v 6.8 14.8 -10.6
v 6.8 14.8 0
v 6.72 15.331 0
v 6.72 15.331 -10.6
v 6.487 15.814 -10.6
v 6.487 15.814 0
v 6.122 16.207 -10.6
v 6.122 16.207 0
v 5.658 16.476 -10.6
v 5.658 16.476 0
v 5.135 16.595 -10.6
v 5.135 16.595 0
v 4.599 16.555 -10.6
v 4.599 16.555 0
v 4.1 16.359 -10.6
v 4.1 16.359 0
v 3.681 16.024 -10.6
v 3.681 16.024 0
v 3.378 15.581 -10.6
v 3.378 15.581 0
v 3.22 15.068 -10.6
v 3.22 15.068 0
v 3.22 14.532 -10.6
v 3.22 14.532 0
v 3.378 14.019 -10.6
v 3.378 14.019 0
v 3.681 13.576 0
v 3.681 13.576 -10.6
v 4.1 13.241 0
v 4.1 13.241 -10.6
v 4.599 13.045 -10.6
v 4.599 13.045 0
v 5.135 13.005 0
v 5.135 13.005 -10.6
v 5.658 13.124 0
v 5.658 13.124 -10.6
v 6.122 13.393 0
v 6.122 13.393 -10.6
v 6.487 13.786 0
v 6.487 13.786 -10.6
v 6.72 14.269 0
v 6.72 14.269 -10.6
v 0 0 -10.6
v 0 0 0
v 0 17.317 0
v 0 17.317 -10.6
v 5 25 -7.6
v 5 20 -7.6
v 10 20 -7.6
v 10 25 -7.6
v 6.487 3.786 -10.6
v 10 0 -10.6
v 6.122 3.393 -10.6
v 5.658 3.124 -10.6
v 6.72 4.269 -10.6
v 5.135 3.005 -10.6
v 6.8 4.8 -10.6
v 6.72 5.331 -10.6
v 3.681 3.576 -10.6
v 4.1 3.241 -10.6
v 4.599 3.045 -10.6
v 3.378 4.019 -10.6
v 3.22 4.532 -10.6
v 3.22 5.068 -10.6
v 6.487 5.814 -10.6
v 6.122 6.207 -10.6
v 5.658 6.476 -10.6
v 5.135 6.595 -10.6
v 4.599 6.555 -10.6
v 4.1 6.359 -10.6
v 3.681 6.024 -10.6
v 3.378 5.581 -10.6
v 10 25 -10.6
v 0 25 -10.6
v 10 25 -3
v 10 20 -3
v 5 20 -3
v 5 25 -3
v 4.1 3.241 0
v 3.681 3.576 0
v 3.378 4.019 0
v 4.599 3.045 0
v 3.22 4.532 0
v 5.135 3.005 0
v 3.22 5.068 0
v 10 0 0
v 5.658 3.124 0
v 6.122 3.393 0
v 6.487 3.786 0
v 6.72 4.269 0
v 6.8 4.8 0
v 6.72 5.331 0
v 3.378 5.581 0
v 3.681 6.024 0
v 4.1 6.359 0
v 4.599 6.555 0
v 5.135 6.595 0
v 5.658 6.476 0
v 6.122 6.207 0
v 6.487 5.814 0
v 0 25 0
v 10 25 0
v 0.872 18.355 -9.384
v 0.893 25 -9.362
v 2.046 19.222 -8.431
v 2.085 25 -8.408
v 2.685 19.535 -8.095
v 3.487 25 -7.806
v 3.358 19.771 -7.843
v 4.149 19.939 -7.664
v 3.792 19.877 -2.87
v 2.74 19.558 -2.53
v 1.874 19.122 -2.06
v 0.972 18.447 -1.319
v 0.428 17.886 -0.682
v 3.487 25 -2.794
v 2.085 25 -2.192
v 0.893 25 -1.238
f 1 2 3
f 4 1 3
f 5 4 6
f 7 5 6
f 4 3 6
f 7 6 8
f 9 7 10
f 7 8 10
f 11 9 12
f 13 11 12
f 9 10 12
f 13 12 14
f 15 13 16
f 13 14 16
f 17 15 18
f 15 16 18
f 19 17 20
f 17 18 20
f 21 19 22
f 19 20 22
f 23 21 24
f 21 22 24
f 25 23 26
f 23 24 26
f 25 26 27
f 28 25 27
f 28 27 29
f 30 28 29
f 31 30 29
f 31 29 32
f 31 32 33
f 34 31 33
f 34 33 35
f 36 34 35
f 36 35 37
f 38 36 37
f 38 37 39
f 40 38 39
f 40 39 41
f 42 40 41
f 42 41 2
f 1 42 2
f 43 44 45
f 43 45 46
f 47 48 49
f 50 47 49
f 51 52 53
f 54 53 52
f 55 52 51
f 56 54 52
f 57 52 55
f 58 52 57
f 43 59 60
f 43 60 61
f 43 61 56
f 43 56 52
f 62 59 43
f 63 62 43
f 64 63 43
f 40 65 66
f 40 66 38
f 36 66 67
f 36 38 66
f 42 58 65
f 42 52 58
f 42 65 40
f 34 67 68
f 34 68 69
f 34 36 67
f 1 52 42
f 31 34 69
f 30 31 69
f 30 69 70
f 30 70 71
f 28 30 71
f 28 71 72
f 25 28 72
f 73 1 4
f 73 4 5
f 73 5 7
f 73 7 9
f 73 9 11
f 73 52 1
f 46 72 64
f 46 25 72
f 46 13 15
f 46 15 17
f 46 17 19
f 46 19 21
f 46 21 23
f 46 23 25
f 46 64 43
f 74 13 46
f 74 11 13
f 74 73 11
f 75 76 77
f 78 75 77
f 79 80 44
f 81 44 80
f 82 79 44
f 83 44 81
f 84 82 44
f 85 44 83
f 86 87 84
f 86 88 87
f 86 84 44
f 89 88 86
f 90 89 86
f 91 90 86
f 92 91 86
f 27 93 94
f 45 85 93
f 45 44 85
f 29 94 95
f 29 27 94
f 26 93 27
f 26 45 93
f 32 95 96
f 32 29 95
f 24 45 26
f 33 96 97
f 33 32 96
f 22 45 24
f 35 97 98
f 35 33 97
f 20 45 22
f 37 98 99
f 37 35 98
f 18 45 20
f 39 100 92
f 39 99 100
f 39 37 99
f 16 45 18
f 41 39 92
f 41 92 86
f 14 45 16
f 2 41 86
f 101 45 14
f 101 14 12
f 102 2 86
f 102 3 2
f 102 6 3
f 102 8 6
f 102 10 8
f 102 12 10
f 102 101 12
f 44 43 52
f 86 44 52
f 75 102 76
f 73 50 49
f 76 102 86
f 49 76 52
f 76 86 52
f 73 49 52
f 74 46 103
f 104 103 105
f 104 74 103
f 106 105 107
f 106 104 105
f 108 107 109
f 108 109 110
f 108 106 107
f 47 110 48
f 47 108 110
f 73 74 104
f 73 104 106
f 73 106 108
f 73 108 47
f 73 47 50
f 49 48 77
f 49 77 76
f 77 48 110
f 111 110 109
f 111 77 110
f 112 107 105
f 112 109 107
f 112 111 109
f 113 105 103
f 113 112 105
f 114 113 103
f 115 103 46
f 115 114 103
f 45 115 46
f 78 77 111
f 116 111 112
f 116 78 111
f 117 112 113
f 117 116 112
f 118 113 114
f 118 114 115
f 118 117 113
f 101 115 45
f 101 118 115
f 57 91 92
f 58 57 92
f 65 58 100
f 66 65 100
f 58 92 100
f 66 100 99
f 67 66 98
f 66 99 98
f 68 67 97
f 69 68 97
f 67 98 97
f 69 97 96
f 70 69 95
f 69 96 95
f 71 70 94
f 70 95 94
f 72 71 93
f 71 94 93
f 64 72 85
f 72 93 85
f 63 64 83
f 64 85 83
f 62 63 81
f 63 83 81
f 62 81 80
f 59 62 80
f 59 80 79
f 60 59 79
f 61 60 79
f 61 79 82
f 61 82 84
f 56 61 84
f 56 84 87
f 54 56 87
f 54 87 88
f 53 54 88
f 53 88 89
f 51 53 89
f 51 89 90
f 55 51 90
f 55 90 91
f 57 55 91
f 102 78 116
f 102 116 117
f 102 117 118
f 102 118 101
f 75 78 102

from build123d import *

# Parameters (mm, degrees)
SKETCH1_W                       = 10
SKETCH1_H                       = 10.6
BOSS_EXTRUDE1_DEPTH             = 20
CUT_EXTRUDE1_DEPTH              = 25.745908753
BOSS_EXTRUDE2_DEPTH             = 5
BOSS_EXTRUDE2_DIRECTION_2_REACH = 26.746
SKETCH5_R                       = 1.8
CUT_EXTRUDE2_DEPTH              = 29.937173447


with BuildPart() as part:
    # Sketch1 → Boss-Extrude1 (new body)
    with BuildSketch(Plane(origin=(0, 0, 0), x_dir=(1, 0, 0), z_dir=(0, 1, 0))):
        with Locations((5, 5.3)):
            Rectangle(SKETCH1_W, SKETCH1_H)
    extrude(amount=BOSS_EXTRUDE1_DEPTH)

    # Sketch3 → Cut-Extrude1 (cut, through all)
    with BuildSketch(Plane.XY):
        with BuildLine():
            Line((0, 17.31662479), (0, 20))
            Line((0, 20), (5, 20))
            ThreePointArc((5, 20), (2.162725669, 19.286764074), (0, 17.31662479))
        make_face()
    extrude(amount=-CUT_EXTRUDE1_DEPTH, mode=Mode.SUBTRACT)

    # Sketch4 → Boss-Extrude2 (add)
    with BuildSketch(Plane(origin=(0, 20, 0), x_dir=(1, 0, 0), z_dir=(0, 1, 0))):
        with BuildLine():
            Line((10, 10.6), (0, 10.6))
            ThreePointArc((0, 10.6), (2.084524053, 8.407540088), (5, 7.6))
            Line((5, 7.6), (10, 7.6))
            Line((10, 7.6), (10, 10.6))
        make_face()
        with BuildLine():
            Line((0, 0), (10, 0))
            Line((10, 0), (10, 3))
            Line((10, 3), (5, 3))
            ThreePointArc((5, 3), (2.084524053, 2.192459912), (0, 0))
        make_face()
    extrude(amount=BOSS_EXTRUDE2_DEPTH)

    # Sketch4 → Boss-Extrude2 direction 2 (add, up to next)
    with BuildSketch(Plane(origin=(0, 20, 0), x_dir=(1, 0, 0), z_dir=(0, 1, 0)), mode=Mode.PRIVATE) as boss_extrude2_direction_2_sk1:
        with BuildLine():
            Line((10, 10.6), (0, 10.6))
            ThreePointArc((0, 10.6), (2.084524053, 8.407540088), (5, 7.6))
            Line((5, 7.6), (10, 7.6))
            Line((10, 7.6), (10, 10.6))
        make_face()
    boss_extrude2_direction_2_tool1 = extrude(boss_extrude2_direction_2_sk1.sketch, amount=-BOSS_EXTRUDE2_DIRECTION_2_REACH, mode=Mode.PRIVATE) - part.part
    # Sketch4 → Boss-Extrude2 direction 2 (add, up to next)
    with BuildSketch(Plane(origin=(0, 20, 0), x_dir=(1, 0, 0), z_dir=(0, 1, 0)), mode=Mode.PRIVATE) as boss_extrude2_direction_2_sk2:
        with BuildLine():
            Line((0, 0), (10, 0))
            Line((10, 0), (10, 3))
            Line((10, 3), (5, 3))
            ThreePointArc((5, 3), (2.084524053, 2.192459912), (0, 0))
        make_face()
    boss_extrude2_direction_2_tool2 = extrude(boss_extrude2_direction_2_sk2.sketch, amount=-BOSS_EXTRUDE2_DIRECTION_2_REACH, mode=Mode.PRIVATE) - part.part
    add(boss_extrude2_direction_2_tool1.solids().sort_by_distance((5.642353, 20, -9.211407))[0])
    add(boss_extrude2_direction_2_tool2.solids().sort_by_distance((5.642353, 20, -1.388593))[0])

    # Sketch5 → Cut-Extrude2 (cut, through all)
    with BuildSketch(Plane.XY):
        with Locations((5, 14.8)):
            Circle(SKETCH5_R)
        with Locations((5, 4.8)):
            Circle(SKETCH5_R)
    extrude(amount=-CUT_EXTRUDE2_DEPTH, mode=Mode.SUBTRACT)


solid = part.part
